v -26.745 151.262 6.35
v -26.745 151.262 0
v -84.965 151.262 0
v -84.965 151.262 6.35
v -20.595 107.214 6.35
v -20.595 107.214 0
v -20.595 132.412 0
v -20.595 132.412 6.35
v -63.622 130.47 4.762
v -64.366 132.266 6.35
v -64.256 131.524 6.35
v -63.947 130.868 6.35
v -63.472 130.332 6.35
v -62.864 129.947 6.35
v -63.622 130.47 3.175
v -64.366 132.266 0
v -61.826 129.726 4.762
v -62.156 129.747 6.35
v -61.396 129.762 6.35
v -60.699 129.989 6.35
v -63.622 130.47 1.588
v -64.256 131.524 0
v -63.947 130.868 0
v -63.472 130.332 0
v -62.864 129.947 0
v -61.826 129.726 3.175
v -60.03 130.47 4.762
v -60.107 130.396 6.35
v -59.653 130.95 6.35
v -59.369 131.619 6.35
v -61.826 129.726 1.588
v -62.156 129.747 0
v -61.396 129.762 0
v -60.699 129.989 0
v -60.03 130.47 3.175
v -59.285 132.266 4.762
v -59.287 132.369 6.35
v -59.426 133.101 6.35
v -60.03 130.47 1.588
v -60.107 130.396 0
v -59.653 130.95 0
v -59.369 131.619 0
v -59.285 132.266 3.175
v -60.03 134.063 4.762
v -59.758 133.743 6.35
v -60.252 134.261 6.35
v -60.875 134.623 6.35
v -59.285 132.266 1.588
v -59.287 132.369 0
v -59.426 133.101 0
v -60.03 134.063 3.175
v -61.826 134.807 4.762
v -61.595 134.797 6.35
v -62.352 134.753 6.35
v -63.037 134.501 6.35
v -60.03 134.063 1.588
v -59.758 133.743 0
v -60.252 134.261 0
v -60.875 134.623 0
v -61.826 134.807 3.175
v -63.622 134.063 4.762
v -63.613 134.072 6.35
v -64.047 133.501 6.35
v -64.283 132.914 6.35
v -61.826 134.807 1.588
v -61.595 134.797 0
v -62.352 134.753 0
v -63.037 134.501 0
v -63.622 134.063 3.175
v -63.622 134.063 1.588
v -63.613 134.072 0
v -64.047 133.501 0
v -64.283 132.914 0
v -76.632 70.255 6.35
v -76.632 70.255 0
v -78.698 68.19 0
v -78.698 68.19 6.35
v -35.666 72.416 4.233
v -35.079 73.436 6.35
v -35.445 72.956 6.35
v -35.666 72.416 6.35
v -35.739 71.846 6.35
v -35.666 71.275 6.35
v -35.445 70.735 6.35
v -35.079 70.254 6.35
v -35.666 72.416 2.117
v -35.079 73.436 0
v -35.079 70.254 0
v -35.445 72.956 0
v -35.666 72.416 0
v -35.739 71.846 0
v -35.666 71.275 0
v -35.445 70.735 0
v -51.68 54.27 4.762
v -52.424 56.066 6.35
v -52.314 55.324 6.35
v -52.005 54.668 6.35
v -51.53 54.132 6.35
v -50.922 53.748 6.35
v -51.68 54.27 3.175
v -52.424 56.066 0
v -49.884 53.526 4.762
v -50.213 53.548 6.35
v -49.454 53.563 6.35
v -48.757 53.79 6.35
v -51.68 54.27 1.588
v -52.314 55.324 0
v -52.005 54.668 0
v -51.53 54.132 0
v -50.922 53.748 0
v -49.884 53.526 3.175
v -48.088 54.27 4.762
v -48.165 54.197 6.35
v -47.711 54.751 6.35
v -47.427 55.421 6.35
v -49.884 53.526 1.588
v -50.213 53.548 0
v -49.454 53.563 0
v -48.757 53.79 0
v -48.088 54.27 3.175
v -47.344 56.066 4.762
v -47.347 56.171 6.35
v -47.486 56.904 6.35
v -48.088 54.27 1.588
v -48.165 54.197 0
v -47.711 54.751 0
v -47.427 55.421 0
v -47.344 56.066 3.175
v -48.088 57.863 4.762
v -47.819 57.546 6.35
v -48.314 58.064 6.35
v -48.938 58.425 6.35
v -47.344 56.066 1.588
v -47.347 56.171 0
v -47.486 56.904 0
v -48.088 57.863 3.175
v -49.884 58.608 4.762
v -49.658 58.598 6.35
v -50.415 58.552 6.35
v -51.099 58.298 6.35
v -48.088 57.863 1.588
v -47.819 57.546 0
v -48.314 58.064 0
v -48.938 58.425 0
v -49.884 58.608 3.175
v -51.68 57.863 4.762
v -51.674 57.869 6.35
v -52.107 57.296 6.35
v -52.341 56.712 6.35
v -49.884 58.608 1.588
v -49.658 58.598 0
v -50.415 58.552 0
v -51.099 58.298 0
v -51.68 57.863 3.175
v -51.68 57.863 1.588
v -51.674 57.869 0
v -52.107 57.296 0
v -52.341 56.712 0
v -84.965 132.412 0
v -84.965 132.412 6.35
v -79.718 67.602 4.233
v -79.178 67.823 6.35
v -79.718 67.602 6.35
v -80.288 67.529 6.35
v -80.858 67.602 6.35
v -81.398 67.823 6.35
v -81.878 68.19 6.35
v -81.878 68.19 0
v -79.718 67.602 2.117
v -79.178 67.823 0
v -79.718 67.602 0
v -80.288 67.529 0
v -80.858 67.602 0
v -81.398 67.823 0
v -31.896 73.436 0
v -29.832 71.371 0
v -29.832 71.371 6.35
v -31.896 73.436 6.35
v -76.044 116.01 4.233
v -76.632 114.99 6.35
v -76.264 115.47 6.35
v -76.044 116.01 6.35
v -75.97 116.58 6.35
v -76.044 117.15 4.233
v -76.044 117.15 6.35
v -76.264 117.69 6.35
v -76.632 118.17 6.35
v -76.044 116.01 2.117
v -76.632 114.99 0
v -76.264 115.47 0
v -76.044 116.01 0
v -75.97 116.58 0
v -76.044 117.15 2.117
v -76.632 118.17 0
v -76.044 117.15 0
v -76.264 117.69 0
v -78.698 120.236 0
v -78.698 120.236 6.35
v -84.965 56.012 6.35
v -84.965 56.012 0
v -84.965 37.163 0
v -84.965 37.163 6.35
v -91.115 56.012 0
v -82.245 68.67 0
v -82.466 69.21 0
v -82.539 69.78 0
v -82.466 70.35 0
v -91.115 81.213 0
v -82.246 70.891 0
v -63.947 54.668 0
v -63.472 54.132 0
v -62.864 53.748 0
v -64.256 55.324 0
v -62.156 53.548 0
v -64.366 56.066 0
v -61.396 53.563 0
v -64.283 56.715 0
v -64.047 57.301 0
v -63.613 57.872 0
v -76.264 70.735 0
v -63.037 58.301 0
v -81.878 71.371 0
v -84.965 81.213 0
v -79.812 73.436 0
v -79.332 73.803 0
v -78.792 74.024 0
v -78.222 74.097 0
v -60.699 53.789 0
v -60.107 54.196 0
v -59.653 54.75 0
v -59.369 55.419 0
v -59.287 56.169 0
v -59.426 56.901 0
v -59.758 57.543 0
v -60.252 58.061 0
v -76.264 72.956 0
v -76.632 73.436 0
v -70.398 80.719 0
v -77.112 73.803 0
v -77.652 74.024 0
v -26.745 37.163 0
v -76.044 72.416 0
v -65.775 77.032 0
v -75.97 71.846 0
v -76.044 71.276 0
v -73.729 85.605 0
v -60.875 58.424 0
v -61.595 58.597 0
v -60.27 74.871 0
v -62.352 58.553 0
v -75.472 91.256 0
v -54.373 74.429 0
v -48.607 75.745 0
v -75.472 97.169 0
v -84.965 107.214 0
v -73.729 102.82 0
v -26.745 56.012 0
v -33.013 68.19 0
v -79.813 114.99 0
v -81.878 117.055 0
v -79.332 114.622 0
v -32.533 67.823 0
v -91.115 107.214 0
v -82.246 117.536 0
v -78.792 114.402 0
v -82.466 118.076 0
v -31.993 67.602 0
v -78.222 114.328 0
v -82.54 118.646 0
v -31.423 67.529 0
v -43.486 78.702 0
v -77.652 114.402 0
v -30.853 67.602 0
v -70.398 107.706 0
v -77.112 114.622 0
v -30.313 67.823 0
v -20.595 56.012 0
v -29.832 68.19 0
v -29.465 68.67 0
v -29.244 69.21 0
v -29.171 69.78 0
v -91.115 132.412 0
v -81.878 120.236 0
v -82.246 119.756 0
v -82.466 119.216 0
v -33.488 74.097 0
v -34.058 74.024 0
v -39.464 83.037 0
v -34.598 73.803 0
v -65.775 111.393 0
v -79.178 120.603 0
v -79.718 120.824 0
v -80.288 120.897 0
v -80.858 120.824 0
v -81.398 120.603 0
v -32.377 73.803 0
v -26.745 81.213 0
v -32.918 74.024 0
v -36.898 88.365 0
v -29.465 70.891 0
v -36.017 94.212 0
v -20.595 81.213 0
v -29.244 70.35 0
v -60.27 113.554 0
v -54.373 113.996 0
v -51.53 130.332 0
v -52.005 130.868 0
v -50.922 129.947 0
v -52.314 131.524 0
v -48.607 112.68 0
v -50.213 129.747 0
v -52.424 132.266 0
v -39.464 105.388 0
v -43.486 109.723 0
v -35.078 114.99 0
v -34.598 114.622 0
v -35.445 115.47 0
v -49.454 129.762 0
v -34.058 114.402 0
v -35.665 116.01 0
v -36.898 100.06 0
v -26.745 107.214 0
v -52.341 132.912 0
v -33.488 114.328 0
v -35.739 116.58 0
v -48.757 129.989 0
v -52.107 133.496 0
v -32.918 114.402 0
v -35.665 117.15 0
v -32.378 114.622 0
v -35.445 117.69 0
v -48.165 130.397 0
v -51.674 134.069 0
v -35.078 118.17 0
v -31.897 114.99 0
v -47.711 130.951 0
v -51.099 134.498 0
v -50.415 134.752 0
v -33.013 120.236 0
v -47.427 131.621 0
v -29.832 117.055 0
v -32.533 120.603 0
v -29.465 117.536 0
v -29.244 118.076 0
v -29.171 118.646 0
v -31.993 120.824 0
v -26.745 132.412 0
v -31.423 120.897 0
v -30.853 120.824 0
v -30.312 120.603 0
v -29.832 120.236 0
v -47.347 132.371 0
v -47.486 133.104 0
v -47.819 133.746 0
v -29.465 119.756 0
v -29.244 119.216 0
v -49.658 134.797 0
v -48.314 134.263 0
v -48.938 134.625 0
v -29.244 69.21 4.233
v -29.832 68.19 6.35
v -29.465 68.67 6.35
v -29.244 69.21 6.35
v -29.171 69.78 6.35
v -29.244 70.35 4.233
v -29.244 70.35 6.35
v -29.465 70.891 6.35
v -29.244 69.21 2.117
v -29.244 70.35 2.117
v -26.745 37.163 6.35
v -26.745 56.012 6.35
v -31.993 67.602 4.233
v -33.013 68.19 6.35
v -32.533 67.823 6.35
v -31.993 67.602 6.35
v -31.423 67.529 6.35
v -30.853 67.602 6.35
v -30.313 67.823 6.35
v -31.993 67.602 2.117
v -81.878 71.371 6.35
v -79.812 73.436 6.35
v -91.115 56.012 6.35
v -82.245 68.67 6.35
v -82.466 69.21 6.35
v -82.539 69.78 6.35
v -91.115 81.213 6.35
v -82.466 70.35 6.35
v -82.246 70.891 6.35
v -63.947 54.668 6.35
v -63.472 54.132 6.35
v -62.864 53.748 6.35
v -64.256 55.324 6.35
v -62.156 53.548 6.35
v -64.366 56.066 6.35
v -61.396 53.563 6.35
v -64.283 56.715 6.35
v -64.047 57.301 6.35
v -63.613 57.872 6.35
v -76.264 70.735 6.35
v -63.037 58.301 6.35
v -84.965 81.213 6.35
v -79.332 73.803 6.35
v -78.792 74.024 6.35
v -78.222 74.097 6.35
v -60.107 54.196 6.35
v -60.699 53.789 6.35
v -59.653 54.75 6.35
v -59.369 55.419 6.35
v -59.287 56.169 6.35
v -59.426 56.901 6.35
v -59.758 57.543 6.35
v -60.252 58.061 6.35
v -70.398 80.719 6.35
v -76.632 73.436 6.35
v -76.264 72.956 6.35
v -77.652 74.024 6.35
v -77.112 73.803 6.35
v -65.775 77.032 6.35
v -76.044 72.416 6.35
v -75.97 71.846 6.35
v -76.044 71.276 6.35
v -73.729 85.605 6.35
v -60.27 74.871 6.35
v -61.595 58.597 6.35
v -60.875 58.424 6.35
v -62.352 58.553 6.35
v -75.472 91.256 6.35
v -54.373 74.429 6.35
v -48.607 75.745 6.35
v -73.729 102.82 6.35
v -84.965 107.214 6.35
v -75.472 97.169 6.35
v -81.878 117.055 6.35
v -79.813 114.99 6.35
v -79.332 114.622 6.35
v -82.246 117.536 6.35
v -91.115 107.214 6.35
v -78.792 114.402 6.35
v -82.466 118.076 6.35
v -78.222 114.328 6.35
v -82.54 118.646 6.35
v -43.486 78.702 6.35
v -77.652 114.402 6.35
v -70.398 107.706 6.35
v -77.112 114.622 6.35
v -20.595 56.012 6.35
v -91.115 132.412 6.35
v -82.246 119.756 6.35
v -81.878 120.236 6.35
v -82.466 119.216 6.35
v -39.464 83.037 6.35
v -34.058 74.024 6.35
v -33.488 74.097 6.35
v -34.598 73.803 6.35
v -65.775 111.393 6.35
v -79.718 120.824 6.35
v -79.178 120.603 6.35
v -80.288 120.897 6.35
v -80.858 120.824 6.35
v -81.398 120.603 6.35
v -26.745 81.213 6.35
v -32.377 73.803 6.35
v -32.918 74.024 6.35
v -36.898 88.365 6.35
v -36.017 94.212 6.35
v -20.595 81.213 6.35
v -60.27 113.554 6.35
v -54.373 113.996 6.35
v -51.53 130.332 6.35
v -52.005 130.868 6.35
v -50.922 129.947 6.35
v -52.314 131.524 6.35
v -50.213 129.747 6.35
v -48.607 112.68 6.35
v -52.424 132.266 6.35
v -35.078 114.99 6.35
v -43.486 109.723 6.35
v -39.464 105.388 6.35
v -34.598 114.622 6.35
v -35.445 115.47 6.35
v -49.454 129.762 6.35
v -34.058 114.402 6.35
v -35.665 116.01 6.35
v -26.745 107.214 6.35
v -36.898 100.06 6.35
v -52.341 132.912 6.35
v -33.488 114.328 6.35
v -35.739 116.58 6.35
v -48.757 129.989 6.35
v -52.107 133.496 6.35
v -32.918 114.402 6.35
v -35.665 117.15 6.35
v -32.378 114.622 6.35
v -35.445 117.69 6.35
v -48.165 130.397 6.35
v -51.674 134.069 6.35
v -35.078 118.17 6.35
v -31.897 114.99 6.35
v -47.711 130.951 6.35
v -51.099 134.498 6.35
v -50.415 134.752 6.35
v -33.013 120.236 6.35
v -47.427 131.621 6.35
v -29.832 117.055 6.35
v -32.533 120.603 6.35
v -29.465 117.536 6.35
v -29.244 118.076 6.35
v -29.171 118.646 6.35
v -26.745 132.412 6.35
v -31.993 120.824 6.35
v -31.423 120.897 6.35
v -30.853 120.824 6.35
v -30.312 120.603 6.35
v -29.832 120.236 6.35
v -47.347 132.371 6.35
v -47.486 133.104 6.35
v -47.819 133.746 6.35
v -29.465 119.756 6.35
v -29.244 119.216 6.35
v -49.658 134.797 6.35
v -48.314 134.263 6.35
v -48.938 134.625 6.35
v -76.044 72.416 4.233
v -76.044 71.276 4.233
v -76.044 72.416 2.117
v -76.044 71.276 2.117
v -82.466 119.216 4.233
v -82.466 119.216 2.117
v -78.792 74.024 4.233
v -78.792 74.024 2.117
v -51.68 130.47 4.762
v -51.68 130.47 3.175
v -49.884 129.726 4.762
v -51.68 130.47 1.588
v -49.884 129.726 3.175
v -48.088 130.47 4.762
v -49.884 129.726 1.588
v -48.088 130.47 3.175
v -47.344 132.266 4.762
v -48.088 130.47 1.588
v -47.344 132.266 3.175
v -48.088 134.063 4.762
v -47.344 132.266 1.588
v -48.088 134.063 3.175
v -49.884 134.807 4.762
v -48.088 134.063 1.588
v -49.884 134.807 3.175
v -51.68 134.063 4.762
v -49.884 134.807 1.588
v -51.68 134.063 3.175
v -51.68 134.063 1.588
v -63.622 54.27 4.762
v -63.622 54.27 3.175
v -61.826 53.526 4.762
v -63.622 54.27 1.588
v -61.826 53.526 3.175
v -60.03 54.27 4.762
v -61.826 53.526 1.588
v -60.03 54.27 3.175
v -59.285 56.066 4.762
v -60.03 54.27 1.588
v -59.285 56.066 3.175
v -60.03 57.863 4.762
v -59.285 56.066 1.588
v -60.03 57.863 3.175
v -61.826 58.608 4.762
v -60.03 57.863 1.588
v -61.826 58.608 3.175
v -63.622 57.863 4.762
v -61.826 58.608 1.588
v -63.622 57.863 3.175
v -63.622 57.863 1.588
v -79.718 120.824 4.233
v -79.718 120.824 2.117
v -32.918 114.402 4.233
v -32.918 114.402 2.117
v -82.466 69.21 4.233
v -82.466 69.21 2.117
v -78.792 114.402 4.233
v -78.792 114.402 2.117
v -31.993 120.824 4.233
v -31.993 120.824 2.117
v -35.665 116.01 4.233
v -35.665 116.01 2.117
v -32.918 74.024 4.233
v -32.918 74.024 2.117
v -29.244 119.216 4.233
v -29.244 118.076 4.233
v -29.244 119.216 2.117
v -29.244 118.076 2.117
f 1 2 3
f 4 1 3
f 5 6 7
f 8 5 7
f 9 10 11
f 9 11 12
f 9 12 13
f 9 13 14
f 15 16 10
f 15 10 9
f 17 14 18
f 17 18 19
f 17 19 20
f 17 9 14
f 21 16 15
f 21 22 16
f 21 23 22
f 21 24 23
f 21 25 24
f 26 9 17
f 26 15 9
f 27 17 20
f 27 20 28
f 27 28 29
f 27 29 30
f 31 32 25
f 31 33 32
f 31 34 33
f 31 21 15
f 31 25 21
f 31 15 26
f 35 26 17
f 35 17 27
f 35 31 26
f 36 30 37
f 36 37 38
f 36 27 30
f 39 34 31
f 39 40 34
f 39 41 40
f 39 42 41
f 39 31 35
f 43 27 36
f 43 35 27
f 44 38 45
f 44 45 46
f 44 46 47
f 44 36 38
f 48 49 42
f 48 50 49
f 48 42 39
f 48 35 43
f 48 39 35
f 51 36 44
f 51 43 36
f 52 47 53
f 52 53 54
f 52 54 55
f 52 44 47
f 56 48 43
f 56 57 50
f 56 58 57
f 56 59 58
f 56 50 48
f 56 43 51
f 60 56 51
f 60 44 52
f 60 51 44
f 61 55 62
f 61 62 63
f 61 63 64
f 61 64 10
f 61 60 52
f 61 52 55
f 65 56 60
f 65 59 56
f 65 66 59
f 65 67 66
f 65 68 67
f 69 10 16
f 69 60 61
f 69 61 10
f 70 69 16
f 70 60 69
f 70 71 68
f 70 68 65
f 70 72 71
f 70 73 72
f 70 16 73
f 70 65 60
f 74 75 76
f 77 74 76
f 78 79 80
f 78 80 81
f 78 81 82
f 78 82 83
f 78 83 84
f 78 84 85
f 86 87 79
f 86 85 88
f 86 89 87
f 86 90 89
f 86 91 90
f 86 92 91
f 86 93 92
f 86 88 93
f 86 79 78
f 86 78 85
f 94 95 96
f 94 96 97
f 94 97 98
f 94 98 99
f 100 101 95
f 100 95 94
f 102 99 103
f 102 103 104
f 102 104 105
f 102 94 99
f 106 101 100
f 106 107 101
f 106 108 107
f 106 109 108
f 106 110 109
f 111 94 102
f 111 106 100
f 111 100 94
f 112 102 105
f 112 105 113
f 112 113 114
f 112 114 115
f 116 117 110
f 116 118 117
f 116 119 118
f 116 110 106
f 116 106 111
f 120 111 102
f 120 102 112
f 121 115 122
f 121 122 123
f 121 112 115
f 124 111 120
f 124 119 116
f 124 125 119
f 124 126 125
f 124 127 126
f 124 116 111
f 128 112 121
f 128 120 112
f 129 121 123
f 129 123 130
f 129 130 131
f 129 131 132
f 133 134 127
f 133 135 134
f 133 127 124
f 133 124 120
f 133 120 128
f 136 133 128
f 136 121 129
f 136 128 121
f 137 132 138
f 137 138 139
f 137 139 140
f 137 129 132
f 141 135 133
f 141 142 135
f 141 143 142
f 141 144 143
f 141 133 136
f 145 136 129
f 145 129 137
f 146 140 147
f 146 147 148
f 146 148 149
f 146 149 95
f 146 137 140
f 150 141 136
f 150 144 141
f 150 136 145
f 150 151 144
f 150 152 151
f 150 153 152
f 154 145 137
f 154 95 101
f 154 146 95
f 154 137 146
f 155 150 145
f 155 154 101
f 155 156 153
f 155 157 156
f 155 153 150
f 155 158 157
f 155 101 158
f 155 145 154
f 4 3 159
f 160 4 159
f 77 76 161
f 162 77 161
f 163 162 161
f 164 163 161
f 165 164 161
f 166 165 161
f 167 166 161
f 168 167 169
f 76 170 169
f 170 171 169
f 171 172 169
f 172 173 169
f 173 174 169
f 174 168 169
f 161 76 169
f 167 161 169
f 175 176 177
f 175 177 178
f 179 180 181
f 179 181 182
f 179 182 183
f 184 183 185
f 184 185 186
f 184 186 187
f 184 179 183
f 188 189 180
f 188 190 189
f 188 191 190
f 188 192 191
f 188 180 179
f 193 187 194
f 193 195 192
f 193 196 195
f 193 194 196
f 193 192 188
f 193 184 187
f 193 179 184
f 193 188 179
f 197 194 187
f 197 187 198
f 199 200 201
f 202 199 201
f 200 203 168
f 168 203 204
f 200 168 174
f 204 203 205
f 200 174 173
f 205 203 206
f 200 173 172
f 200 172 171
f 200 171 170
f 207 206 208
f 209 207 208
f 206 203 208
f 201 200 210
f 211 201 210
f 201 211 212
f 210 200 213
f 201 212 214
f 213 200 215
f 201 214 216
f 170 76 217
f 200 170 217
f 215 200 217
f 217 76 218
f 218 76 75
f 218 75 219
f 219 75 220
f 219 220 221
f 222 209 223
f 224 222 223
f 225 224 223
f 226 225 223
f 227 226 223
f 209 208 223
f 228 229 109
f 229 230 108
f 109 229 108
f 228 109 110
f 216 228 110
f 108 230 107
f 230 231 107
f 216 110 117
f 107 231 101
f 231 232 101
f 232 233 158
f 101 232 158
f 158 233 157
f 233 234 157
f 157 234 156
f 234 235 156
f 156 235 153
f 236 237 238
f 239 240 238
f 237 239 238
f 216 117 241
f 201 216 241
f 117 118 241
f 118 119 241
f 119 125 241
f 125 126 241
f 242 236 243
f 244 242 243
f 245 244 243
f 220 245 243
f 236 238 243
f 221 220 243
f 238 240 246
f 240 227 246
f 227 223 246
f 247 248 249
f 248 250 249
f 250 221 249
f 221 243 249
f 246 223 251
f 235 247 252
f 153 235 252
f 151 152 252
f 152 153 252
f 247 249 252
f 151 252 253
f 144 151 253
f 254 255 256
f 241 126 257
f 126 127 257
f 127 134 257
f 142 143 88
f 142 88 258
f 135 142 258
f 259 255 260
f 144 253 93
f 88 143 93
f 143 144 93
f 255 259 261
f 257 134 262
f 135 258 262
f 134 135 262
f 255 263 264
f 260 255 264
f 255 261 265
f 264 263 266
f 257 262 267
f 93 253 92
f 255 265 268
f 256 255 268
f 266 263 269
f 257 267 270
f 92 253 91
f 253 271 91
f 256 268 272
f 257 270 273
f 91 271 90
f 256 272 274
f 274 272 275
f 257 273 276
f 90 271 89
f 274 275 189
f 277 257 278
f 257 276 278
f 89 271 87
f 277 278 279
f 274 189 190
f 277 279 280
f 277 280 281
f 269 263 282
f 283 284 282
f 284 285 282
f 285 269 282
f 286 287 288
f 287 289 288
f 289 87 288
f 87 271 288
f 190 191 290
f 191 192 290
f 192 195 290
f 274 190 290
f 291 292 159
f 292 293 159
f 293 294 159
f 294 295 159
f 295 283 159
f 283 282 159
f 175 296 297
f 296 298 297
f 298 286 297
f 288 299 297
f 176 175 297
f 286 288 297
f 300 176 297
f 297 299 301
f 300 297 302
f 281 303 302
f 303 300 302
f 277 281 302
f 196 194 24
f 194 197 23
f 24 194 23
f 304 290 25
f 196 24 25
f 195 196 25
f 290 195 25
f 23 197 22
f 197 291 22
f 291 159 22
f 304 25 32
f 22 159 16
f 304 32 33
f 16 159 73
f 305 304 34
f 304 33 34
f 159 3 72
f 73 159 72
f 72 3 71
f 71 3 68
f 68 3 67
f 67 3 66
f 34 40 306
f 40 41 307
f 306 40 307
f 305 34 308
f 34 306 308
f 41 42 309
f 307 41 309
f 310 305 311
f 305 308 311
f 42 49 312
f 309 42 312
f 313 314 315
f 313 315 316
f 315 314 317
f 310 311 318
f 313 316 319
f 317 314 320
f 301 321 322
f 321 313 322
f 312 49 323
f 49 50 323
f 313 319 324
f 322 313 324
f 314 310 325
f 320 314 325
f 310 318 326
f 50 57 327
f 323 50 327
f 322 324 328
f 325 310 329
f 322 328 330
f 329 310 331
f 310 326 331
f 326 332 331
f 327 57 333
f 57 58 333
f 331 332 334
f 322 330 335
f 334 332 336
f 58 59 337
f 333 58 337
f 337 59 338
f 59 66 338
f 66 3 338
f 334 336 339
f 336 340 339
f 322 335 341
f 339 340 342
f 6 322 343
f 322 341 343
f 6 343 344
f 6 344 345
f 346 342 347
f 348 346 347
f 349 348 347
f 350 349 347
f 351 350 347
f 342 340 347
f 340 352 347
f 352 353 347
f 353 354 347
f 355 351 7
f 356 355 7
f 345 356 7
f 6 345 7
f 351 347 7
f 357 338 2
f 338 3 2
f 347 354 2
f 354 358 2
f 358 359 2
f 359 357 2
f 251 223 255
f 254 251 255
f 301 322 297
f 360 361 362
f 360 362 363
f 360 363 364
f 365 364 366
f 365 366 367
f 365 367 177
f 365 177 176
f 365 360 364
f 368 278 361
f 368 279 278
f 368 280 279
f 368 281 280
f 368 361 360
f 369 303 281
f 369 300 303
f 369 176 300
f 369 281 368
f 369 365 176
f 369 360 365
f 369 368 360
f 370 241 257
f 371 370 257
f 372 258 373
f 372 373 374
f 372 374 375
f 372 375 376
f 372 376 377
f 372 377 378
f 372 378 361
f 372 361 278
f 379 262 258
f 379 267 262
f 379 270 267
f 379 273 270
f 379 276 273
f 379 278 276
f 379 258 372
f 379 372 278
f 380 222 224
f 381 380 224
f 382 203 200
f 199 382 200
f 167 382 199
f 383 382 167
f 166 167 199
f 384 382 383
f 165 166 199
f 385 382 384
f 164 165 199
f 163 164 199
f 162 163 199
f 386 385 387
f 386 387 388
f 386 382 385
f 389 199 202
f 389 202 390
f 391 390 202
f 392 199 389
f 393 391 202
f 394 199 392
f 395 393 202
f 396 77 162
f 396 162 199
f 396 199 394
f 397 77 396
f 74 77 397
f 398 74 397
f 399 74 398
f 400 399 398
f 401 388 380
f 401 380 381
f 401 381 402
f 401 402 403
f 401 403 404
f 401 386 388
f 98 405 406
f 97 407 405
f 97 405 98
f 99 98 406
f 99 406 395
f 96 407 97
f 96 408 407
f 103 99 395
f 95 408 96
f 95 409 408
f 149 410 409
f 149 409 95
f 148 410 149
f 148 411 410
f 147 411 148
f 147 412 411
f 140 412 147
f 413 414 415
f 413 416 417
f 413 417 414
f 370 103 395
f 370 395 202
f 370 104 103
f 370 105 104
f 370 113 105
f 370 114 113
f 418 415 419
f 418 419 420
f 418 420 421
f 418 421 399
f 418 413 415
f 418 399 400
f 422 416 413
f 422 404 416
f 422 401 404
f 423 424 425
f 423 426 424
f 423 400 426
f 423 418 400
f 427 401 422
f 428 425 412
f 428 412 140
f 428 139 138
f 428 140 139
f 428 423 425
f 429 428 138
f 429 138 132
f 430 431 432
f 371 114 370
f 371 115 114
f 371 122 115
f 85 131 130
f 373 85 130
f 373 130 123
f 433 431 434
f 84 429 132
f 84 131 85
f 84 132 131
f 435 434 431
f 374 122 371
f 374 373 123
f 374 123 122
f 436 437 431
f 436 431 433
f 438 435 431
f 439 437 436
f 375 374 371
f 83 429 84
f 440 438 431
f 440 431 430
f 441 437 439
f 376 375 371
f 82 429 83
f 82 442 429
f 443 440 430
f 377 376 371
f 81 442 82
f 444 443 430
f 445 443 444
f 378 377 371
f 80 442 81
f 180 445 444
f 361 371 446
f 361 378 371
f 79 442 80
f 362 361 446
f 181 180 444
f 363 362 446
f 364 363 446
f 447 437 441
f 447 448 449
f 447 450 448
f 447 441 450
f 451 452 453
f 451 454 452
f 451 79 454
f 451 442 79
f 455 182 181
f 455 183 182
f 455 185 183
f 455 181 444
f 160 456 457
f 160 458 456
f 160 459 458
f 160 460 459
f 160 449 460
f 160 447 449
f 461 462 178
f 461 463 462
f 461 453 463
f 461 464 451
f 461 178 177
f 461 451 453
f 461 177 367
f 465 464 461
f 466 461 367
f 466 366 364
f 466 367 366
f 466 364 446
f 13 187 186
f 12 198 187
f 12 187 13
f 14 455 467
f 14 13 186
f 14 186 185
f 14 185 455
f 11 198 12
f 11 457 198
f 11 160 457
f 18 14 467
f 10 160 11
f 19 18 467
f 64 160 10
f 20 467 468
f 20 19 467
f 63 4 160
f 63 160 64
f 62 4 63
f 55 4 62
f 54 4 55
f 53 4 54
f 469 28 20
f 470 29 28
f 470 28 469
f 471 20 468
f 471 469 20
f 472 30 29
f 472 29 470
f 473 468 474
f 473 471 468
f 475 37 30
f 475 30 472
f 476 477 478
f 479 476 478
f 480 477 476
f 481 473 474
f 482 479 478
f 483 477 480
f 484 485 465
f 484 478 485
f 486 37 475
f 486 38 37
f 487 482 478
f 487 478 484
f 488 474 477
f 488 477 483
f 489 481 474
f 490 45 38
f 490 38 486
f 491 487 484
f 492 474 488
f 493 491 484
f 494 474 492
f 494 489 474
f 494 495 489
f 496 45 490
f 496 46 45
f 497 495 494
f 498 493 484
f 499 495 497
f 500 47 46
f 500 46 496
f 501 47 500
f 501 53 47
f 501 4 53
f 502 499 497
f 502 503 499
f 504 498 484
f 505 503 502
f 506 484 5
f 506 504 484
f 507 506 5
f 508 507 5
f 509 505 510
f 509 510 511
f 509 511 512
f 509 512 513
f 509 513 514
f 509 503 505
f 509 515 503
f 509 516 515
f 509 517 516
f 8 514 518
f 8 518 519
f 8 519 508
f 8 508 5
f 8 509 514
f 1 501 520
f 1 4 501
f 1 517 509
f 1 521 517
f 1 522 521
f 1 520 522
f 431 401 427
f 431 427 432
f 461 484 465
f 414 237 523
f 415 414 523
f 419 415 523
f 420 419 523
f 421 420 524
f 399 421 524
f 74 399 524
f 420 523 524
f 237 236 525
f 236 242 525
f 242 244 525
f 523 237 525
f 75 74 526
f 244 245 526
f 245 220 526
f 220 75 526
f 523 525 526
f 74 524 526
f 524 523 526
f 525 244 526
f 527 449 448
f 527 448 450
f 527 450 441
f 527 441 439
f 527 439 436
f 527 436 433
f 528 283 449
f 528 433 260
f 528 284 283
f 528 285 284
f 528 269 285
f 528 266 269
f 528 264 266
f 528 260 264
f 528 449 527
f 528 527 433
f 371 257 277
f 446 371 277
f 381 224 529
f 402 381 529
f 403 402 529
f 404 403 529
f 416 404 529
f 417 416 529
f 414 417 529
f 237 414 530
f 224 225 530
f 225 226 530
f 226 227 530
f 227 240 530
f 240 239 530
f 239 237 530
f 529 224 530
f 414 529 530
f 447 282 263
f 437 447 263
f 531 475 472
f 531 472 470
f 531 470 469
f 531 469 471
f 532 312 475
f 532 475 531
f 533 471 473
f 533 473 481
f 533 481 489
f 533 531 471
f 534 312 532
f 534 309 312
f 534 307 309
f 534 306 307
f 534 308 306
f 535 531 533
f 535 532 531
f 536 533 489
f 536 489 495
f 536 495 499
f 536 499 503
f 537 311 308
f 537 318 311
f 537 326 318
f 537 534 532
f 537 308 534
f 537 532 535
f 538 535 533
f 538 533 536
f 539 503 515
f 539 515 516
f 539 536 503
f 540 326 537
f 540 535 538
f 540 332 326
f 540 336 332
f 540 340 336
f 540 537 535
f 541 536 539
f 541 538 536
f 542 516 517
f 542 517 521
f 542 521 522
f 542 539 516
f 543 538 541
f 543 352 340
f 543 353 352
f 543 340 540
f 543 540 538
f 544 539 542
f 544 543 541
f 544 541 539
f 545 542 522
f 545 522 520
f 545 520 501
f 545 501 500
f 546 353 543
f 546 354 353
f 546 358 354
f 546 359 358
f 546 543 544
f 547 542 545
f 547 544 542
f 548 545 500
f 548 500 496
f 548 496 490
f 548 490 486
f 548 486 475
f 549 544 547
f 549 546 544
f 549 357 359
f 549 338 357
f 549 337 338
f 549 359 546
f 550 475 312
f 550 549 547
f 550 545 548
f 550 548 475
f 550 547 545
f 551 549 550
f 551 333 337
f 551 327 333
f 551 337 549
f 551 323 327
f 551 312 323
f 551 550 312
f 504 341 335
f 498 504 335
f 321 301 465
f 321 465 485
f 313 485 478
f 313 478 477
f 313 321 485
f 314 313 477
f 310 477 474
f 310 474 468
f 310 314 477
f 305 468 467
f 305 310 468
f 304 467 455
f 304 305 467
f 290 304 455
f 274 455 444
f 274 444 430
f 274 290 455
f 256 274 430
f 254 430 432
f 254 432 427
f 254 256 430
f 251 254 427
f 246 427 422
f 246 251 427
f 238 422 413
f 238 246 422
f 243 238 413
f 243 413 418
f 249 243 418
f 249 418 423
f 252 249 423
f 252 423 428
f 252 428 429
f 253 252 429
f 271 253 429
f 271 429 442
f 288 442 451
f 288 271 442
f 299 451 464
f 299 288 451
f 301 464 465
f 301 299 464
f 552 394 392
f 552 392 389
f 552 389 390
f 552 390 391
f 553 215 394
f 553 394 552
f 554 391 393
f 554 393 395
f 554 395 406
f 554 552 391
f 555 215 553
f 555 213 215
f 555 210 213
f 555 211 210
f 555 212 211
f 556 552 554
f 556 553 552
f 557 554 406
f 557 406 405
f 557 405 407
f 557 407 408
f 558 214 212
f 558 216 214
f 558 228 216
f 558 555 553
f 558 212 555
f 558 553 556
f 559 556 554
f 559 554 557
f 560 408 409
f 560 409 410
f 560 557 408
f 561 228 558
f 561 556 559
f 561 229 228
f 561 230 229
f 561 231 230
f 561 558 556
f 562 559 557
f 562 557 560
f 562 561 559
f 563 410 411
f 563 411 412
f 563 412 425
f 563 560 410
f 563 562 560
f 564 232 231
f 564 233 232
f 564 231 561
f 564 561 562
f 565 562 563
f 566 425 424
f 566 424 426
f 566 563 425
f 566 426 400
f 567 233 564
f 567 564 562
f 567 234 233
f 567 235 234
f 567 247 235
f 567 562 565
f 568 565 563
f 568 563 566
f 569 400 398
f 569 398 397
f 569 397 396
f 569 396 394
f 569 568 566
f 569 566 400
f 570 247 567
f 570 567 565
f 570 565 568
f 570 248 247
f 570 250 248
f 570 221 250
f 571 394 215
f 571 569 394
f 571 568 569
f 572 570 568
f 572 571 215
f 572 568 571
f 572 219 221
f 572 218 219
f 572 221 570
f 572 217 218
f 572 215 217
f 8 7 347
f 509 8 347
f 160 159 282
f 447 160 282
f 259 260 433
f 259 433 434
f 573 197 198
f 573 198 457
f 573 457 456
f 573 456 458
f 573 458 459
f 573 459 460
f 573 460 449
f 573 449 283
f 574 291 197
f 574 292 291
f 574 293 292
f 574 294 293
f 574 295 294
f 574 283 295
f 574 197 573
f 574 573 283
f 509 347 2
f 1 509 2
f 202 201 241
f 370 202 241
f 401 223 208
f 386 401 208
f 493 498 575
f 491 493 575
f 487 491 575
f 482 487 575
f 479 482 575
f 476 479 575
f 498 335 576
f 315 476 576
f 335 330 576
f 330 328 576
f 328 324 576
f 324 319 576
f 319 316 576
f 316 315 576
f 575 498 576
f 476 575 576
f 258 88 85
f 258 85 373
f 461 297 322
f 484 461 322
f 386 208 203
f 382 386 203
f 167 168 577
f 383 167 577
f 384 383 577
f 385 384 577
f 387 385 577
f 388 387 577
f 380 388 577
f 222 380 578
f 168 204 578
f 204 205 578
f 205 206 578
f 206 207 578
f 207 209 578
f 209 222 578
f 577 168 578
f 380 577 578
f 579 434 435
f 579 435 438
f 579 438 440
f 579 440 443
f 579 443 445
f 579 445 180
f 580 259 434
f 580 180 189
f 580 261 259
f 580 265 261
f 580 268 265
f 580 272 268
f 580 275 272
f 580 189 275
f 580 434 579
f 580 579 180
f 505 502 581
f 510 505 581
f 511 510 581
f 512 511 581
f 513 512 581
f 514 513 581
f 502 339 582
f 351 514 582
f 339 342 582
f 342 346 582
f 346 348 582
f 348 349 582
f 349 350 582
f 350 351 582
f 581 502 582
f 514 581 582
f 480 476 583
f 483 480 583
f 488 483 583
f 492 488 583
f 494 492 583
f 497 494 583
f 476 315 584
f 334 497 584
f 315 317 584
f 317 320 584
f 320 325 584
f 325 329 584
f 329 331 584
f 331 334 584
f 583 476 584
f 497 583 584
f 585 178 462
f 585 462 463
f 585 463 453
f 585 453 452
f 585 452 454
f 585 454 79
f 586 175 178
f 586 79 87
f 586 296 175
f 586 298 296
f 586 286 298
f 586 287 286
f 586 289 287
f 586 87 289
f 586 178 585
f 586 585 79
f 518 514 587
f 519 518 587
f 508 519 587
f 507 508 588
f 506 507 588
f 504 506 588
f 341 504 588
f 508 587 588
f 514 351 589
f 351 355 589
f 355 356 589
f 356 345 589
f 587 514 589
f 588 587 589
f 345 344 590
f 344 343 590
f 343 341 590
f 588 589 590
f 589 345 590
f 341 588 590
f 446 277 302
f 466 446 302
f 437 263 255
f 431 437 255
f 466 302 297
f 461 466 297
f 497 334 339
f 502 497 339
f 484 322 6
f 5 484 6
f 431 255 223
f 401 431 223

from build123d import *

# Parameters (mm, degrees)
MODEL_R             = 19.8387
BOSS_EXTRUDE1_DEPTH = 6.35


with BuildPart() as part:
    # Model → Boss-Extrude1 (new body)
    with BuildSketch(Plane.XY):
        Polygon((-20.5954, 132.4124), (-26.7451, 132.4124), (-26.7451, 151.262), (-84.9649, 151.262), (-84.9649, 132.4124), (-91.1147, 132.4124), (-91.1147, 107.2136), (-84.9649, 107.2136), (-84.9649, 81.2129), (-91.1147, 81.2129), (-91.1147, 56.0124), (-84.9649, 56.0124), (-84.9649, 37.1628), (-26.7451, 37.1628), (-26.7451, 56.0124), (-20.5954, 56.0124), (-20.5954, 81.2129), (-26.7451, 81.2129), (-26.7451, 107.2136), (-20.5954, 107.2136), align=None)
        with Locations((-55.8552, 94.2124)):
            Circle(MODEL_R, mode=Mode.SUBTRACT)
        with BuildLine():
            Line((-76.6319, 70.2547), (-78.6976, 68.1899))
            add(Edge.make_bspline(
                [(-78.6976, 68.1899), (-79.578, 67.3086), (-80.9971, 67.3086), (-81.878, 68.1903)],
                knots=[0.142857143, 0.142857143, 0.142857143, 0.142857143, 0.285714286, 0.285714286, 0.285714286, 0.285714286], degree=3))
            add(Edge.make_bspline(
                [(-81.878, 68.1903), (-82.7596, 69.0707), (-82.7601, 70.4902), (-81.878, 71.3707)],
                knots=[0.285714286, 0.285714286, 0.285714286, 0.285714286, 0.428571429, 0.428571429, 0.428571429, 0.428571429], degree=3))
            Line((-81.878, 71.3707), (-79.8123, 73.4364))
            add(Edge.make_bspline(
                [(-79.8123, 73.4364), (-78.9314, 74.3172), (-77.5119, 74.3172), (-76.6315, 73.4364)],
                knots=[0.571428571, 0.571428571, 0.571428571, 0.571428571, 0.714285714, 0.714285714, 0.714285714, 0.714285714], degree=3))
            add(Edge.make_bspline(
                [(-76.6315, 73.4364), (-75.7498, 72.5547), (-75.7498, 71.1368), (-76.6319, 70.2547)],
                knots=[0.714285714, 0.714285714, 0.714285714, 0.714285714, 1, 1, 1, 1], degree=3))
        make_face(mode=Mode.SUBTRACT)
        with BuildLine():
            Line((-29.8321, 117.0554), (-31.897, 114.9897))
            add(Edge.make_bspline(
                [(-31.897, 114.9897), (-32.7791, 114.1076), (-34.1965, 114.1076), (-35.0782, 114.9897)],
                knots=[0.142857143, 0.142857143, 0.142857143, 0.142857143, 0.285714286, 0.285714286, 0.285714286, 0.285714286], degree=3))
            add(Edge.make_bspline(
                [(-35.0782, 114.9897), (-35.959, 115.8705), (-35.959, 117.2896), (-35.0782, 118.1705)],
                knots=[0.285714286, 0.285714286, 0.285714286, 0.285714286, 0.428571429, 0.428571429, 0.428571429, 0.428571429], degree=3))
            Line((-35.0782, 118.1705), (-33.0129, 120.2357))
            add(Edge.make_bspline(
                [(-33.0129, 120.2357), (-32.1324, 121.1178), (-30.7129, 121.1178), (-29.8321, 120.2357)],
                knots=[0.571428571, 0.571428571, 0.571428571, 0.571428571, 0.714285714, 0.714285714, 0.714285714, 0.714285714], degree=3))
            add(Edge.make_bspline(
                [(-29.8321, 120.2357), (-28.95, 119.3553), (-28.9504, 117.9362), (-29.8321, 117.0554)],
                knots=[0.714285714, 0.714285714, 0.714285714, 0.714285714, 1, 1, 1, 1], degree=3))
        make_face(mode=Mode.SUBTRACT)
        with BuildLine():
            Line((-29.8321, 71.3707), (-31.8965, 73.4364))
            add(Edge.make_bspline(
                [(-31.8965, 73.4364), (-32.7786, 74.3172), (-34.1969, 74.3172), (-35.0786, 73.4364)],
                knots=[0.142857143, 0.142857143, 0.142857143, 0.142857143, 0.285714286, 0.285714286, 0.285714286, 0.285714286], degree=3))
            add(Edge.make_bspline(
                [(-35.0786, 73.4364), (-35.959, 72.5547), (-35.959, 71.1364), (-35.0786, 70.2543)],
                knots=[0.285714286, 0.285714286, 0.285714286, 0.285714286, 0.428571429, 0.428571429, 0.428571429, 0.428571429], degree=3))
            Line((-35.0786, 70.2543), (-33.0129, 68.1899))
            add(Edge.make_bspline(
                [(-33.0129, 68.1899), (-32.1324, 67.3082), (-30.7129, 67.3086), (-29.8325, 68.1903)],
                knots=[0.571428571, 0.571428571, 0.571428571, 0.571428571, 0.714285714, 0.714285714, 0.714285714, 0.714285714], degree=3))
            add(Edge.make_bspline(
                [(-29.8325, 68.1903), (-28.9504, 69.0707), (-28.95, 70.4902), (-29.8321, 71.3707)],
                knots=[0.714285714, 0.714285714, 0.714285714, 0.714285714, 1, 1, 1, 1], degree=3))
        make_face(mode=Mode.SUBTRACT)
        with BuildLine():
            Line((-76.6319, 118.1705), (-78.6976, 120.2357))
            add(Edge.make_bspline(
                [(-78.6976, 120.2357), (-79.578, 121.1178), (-80.9975, 121.1178), (-81.878, 120.2357)],
                knots=[0.142857143, 0.142857143, 0.142857143, 0.142857143, 0.285714286, 0.285714286, 0.285714286, 0.285714286], degree=3))
            add(Edge.make_bspline(
                [(-81.878, 120.2357), (-82.7601, 119.3553), (-82.7601, 117.9358), (-81.878, 117.0554)],
                knots=[0.285714286, 0.285714286, 0.285714286, 0.285714286, 0.428571429, 0.428571429, 0.428571429, 0.428571429], degree=3))
            Line((-81.878, 117.0554), (-79.8127, 114.9897))
            add(Edge.make_bspline(
                [(-79.8127, 114.9897), (-78.9322, 114.1076), (-77.5123, 114.1076), (-76.6319, 114.9897)],
                knots=[0.571428571, 0.571428571, 0.571428571, 0.571428571, 0.714285714, 0.714285714, 0.714285714, 0.714285714], degree=3))
            add(Edge.make_bspline(
                [(-76.6319, 114.9897), (-75.7498, 115.8705), (-75.7498, 117.29), (-76.6319, 118.1705)],
                knots=[0.714285714, 0.714285714, 0.714285714, 0.714285714, 1, 1, 1, 1], degree=3))
        make_face(mode=Mode.SUBTRACT)
        with BuildLine():
            add(Edge.make_bspline(
                [(-61.8264, 129.7262), (-60.4231, 129.7262), (-59.2852, 130.8633), (-59.2852, 132.2662)],
                knots=[0, 0, 0, 0, 0.2, 0.2, 0.2, 0.2], degree=3))
            add(Edge.make_bspline(
                [(-59.2852, 132.2662), (-59.2852, 133.6691), (-60.4231, 134.8074), (-61.8264, 134.8074)],
                knots=[0.2, 0.2, 0.2, 0.2, 0.4, 0.4, 0.4, 0.4], degree=3))
            add(Edge.make_bspline(
                [(-61.8264, 134.8074), (-63.2289, 134.8074), (-64.366, 133.6691), (-64.366, 132.2662)],
                knots=[0.4, 0.4, 0.4, 0.4, 0.6, 0.6, 0.6, 0.6], degree=3))
            add(Edge.make_bspline(
                [(-64.366, 132.2662), (-64.366, 130.8633), (-63.2289, 129.7262), (-61.8264, 129.7262)],
                knots=[0.6, 0.6, 0.6, 0.6, 1, 1, 1, 1], degree=3))
        make_face(mode=Mode.SUBTRACT)
        with BuildLine():
            add(Edge.make_bspline(
                [(-61.8264, 53.5264), (-60.4231, 53.5264), (-59.2852, 54.6635), (-59.2852, 56.0664)],
                knots=[0, 0, 0, 0, 0.2, 0.2, 0.2, 0.2], degree=3))
            add(Edge.make_bspline(
                [(-59.2852, 56.0664), (-59.2852, 57.4693), (-60.4231, 58.6076), (-61.8264, 58.6076)],
                knots=[0.2, 0.2, 0.2, 0.2, 0.4, 0.4, 0.4, 0.4], degree=3))
            add(Edge.make_bspline(
                [(-61.8264, 58.6076), (-63.2289, 58.6076), (-64.366, 57.4693), (-64.366, 56.0664)],
                knots=[0.4, 0.4, 0.4, 0.4, 0.6, 0.6, 0.6, 0.6], degree=3))
            add(Edge.make_bspline(
                [(-64.366, 56.0664), (-64.366, 54.6635), (-63.2289, 53.5264), (-61.8264, 53.5264)],
                knots=[0.6, 0.6, 0.6, 0.6, 1, 1, 1, 1], degree=3))
        make_face(mode=Mode.SUBTRACT)
        with BuildLine():
            add(Edge.make_bspline(
                [(-49.884, 129.7262), (-48.4812, 129.7262), (-47.3445, 130.8633), (-47.3445, 132.2662)],
                knots=[0, 0, 0, 0, 0.2, 0.2, 0.2, 0.2], degree=3))
            add(Edge.make_bspline(
                [(-47.3445, 132.2662), (-47.3445, 133.6691), (-48.4812, 134.8074), (-49.884, 134.8074)],
                knots=[0.2, 0.2, 0.2, 0.2, 0.4, 0.4, 0.4, 0.4], degree=3))
            add(Edge.make_bspline(
                [(-49.884, 134.8074), (-51.2869, 134.8074), (-52.424, 133.6691), (-52.424, 132.2662)],
                knots=[0.4, 0.4, 0.4, 0.4, 0.6, 0.6, 0.6, 0.6], degree=3))
            add(Edge.make_bspline(
                [(-52.424, 132.2662), (-52.424, 130.8633), (-51.2869, 129.7262), (-49.884, 129.7262)],
                knots=[0.6, 0.6, 0.6, 0.6, 1, 1, 1, 1], degree=3))
        make_face(mode=Mode.SUBTRACT)
        with BuildLine():
            add(Edge.make_bspline(
                [(-49.884, 53.5264), (-48.4812, 53.5264), (-47.3445, 54.6635), (-47.3445, 56.0664)],
                knots=[0, 0, 0, 0, 0.2, 0.2, 0.2, 0.2], degree=3))
            add(Edge.make_bspline(
                [(-47.3445, 56.0664), (-47.3445, 57.4693), (-48.4812, 58.6076), (-49.884, 58.6076)],
                knots=[0.2, 0.2, 0.2, 0.2, 0.4, 0.4, 0.4, 0.4], degree=3))
            add(Edge.make_bspline(
                [(-49.884, 58.6076), (-51.2869, 58.6076), (-52.424, 57.4693), (-52.424, 56.0664)],
                knots=[0.4, 0.4, 0.4, 0.4, 0.6, 0.6, 0.6, 0.6], degree=3))
            add(Edge.make_bspline(
                [(-52.424, 56.0664), (-52.424, 54.6635), (-51.2869, 53.5264), (-49.884, 53.5264)],
                knots=[0.6, 0.6, 0.6, 0.6, 1, 1, 1, 1], degree=3))
        make_face(mode=Mode.SUBTRACT)
    extrude(amount=BOSS_EXTRUDE1_DEPTH)


solid = part.part
